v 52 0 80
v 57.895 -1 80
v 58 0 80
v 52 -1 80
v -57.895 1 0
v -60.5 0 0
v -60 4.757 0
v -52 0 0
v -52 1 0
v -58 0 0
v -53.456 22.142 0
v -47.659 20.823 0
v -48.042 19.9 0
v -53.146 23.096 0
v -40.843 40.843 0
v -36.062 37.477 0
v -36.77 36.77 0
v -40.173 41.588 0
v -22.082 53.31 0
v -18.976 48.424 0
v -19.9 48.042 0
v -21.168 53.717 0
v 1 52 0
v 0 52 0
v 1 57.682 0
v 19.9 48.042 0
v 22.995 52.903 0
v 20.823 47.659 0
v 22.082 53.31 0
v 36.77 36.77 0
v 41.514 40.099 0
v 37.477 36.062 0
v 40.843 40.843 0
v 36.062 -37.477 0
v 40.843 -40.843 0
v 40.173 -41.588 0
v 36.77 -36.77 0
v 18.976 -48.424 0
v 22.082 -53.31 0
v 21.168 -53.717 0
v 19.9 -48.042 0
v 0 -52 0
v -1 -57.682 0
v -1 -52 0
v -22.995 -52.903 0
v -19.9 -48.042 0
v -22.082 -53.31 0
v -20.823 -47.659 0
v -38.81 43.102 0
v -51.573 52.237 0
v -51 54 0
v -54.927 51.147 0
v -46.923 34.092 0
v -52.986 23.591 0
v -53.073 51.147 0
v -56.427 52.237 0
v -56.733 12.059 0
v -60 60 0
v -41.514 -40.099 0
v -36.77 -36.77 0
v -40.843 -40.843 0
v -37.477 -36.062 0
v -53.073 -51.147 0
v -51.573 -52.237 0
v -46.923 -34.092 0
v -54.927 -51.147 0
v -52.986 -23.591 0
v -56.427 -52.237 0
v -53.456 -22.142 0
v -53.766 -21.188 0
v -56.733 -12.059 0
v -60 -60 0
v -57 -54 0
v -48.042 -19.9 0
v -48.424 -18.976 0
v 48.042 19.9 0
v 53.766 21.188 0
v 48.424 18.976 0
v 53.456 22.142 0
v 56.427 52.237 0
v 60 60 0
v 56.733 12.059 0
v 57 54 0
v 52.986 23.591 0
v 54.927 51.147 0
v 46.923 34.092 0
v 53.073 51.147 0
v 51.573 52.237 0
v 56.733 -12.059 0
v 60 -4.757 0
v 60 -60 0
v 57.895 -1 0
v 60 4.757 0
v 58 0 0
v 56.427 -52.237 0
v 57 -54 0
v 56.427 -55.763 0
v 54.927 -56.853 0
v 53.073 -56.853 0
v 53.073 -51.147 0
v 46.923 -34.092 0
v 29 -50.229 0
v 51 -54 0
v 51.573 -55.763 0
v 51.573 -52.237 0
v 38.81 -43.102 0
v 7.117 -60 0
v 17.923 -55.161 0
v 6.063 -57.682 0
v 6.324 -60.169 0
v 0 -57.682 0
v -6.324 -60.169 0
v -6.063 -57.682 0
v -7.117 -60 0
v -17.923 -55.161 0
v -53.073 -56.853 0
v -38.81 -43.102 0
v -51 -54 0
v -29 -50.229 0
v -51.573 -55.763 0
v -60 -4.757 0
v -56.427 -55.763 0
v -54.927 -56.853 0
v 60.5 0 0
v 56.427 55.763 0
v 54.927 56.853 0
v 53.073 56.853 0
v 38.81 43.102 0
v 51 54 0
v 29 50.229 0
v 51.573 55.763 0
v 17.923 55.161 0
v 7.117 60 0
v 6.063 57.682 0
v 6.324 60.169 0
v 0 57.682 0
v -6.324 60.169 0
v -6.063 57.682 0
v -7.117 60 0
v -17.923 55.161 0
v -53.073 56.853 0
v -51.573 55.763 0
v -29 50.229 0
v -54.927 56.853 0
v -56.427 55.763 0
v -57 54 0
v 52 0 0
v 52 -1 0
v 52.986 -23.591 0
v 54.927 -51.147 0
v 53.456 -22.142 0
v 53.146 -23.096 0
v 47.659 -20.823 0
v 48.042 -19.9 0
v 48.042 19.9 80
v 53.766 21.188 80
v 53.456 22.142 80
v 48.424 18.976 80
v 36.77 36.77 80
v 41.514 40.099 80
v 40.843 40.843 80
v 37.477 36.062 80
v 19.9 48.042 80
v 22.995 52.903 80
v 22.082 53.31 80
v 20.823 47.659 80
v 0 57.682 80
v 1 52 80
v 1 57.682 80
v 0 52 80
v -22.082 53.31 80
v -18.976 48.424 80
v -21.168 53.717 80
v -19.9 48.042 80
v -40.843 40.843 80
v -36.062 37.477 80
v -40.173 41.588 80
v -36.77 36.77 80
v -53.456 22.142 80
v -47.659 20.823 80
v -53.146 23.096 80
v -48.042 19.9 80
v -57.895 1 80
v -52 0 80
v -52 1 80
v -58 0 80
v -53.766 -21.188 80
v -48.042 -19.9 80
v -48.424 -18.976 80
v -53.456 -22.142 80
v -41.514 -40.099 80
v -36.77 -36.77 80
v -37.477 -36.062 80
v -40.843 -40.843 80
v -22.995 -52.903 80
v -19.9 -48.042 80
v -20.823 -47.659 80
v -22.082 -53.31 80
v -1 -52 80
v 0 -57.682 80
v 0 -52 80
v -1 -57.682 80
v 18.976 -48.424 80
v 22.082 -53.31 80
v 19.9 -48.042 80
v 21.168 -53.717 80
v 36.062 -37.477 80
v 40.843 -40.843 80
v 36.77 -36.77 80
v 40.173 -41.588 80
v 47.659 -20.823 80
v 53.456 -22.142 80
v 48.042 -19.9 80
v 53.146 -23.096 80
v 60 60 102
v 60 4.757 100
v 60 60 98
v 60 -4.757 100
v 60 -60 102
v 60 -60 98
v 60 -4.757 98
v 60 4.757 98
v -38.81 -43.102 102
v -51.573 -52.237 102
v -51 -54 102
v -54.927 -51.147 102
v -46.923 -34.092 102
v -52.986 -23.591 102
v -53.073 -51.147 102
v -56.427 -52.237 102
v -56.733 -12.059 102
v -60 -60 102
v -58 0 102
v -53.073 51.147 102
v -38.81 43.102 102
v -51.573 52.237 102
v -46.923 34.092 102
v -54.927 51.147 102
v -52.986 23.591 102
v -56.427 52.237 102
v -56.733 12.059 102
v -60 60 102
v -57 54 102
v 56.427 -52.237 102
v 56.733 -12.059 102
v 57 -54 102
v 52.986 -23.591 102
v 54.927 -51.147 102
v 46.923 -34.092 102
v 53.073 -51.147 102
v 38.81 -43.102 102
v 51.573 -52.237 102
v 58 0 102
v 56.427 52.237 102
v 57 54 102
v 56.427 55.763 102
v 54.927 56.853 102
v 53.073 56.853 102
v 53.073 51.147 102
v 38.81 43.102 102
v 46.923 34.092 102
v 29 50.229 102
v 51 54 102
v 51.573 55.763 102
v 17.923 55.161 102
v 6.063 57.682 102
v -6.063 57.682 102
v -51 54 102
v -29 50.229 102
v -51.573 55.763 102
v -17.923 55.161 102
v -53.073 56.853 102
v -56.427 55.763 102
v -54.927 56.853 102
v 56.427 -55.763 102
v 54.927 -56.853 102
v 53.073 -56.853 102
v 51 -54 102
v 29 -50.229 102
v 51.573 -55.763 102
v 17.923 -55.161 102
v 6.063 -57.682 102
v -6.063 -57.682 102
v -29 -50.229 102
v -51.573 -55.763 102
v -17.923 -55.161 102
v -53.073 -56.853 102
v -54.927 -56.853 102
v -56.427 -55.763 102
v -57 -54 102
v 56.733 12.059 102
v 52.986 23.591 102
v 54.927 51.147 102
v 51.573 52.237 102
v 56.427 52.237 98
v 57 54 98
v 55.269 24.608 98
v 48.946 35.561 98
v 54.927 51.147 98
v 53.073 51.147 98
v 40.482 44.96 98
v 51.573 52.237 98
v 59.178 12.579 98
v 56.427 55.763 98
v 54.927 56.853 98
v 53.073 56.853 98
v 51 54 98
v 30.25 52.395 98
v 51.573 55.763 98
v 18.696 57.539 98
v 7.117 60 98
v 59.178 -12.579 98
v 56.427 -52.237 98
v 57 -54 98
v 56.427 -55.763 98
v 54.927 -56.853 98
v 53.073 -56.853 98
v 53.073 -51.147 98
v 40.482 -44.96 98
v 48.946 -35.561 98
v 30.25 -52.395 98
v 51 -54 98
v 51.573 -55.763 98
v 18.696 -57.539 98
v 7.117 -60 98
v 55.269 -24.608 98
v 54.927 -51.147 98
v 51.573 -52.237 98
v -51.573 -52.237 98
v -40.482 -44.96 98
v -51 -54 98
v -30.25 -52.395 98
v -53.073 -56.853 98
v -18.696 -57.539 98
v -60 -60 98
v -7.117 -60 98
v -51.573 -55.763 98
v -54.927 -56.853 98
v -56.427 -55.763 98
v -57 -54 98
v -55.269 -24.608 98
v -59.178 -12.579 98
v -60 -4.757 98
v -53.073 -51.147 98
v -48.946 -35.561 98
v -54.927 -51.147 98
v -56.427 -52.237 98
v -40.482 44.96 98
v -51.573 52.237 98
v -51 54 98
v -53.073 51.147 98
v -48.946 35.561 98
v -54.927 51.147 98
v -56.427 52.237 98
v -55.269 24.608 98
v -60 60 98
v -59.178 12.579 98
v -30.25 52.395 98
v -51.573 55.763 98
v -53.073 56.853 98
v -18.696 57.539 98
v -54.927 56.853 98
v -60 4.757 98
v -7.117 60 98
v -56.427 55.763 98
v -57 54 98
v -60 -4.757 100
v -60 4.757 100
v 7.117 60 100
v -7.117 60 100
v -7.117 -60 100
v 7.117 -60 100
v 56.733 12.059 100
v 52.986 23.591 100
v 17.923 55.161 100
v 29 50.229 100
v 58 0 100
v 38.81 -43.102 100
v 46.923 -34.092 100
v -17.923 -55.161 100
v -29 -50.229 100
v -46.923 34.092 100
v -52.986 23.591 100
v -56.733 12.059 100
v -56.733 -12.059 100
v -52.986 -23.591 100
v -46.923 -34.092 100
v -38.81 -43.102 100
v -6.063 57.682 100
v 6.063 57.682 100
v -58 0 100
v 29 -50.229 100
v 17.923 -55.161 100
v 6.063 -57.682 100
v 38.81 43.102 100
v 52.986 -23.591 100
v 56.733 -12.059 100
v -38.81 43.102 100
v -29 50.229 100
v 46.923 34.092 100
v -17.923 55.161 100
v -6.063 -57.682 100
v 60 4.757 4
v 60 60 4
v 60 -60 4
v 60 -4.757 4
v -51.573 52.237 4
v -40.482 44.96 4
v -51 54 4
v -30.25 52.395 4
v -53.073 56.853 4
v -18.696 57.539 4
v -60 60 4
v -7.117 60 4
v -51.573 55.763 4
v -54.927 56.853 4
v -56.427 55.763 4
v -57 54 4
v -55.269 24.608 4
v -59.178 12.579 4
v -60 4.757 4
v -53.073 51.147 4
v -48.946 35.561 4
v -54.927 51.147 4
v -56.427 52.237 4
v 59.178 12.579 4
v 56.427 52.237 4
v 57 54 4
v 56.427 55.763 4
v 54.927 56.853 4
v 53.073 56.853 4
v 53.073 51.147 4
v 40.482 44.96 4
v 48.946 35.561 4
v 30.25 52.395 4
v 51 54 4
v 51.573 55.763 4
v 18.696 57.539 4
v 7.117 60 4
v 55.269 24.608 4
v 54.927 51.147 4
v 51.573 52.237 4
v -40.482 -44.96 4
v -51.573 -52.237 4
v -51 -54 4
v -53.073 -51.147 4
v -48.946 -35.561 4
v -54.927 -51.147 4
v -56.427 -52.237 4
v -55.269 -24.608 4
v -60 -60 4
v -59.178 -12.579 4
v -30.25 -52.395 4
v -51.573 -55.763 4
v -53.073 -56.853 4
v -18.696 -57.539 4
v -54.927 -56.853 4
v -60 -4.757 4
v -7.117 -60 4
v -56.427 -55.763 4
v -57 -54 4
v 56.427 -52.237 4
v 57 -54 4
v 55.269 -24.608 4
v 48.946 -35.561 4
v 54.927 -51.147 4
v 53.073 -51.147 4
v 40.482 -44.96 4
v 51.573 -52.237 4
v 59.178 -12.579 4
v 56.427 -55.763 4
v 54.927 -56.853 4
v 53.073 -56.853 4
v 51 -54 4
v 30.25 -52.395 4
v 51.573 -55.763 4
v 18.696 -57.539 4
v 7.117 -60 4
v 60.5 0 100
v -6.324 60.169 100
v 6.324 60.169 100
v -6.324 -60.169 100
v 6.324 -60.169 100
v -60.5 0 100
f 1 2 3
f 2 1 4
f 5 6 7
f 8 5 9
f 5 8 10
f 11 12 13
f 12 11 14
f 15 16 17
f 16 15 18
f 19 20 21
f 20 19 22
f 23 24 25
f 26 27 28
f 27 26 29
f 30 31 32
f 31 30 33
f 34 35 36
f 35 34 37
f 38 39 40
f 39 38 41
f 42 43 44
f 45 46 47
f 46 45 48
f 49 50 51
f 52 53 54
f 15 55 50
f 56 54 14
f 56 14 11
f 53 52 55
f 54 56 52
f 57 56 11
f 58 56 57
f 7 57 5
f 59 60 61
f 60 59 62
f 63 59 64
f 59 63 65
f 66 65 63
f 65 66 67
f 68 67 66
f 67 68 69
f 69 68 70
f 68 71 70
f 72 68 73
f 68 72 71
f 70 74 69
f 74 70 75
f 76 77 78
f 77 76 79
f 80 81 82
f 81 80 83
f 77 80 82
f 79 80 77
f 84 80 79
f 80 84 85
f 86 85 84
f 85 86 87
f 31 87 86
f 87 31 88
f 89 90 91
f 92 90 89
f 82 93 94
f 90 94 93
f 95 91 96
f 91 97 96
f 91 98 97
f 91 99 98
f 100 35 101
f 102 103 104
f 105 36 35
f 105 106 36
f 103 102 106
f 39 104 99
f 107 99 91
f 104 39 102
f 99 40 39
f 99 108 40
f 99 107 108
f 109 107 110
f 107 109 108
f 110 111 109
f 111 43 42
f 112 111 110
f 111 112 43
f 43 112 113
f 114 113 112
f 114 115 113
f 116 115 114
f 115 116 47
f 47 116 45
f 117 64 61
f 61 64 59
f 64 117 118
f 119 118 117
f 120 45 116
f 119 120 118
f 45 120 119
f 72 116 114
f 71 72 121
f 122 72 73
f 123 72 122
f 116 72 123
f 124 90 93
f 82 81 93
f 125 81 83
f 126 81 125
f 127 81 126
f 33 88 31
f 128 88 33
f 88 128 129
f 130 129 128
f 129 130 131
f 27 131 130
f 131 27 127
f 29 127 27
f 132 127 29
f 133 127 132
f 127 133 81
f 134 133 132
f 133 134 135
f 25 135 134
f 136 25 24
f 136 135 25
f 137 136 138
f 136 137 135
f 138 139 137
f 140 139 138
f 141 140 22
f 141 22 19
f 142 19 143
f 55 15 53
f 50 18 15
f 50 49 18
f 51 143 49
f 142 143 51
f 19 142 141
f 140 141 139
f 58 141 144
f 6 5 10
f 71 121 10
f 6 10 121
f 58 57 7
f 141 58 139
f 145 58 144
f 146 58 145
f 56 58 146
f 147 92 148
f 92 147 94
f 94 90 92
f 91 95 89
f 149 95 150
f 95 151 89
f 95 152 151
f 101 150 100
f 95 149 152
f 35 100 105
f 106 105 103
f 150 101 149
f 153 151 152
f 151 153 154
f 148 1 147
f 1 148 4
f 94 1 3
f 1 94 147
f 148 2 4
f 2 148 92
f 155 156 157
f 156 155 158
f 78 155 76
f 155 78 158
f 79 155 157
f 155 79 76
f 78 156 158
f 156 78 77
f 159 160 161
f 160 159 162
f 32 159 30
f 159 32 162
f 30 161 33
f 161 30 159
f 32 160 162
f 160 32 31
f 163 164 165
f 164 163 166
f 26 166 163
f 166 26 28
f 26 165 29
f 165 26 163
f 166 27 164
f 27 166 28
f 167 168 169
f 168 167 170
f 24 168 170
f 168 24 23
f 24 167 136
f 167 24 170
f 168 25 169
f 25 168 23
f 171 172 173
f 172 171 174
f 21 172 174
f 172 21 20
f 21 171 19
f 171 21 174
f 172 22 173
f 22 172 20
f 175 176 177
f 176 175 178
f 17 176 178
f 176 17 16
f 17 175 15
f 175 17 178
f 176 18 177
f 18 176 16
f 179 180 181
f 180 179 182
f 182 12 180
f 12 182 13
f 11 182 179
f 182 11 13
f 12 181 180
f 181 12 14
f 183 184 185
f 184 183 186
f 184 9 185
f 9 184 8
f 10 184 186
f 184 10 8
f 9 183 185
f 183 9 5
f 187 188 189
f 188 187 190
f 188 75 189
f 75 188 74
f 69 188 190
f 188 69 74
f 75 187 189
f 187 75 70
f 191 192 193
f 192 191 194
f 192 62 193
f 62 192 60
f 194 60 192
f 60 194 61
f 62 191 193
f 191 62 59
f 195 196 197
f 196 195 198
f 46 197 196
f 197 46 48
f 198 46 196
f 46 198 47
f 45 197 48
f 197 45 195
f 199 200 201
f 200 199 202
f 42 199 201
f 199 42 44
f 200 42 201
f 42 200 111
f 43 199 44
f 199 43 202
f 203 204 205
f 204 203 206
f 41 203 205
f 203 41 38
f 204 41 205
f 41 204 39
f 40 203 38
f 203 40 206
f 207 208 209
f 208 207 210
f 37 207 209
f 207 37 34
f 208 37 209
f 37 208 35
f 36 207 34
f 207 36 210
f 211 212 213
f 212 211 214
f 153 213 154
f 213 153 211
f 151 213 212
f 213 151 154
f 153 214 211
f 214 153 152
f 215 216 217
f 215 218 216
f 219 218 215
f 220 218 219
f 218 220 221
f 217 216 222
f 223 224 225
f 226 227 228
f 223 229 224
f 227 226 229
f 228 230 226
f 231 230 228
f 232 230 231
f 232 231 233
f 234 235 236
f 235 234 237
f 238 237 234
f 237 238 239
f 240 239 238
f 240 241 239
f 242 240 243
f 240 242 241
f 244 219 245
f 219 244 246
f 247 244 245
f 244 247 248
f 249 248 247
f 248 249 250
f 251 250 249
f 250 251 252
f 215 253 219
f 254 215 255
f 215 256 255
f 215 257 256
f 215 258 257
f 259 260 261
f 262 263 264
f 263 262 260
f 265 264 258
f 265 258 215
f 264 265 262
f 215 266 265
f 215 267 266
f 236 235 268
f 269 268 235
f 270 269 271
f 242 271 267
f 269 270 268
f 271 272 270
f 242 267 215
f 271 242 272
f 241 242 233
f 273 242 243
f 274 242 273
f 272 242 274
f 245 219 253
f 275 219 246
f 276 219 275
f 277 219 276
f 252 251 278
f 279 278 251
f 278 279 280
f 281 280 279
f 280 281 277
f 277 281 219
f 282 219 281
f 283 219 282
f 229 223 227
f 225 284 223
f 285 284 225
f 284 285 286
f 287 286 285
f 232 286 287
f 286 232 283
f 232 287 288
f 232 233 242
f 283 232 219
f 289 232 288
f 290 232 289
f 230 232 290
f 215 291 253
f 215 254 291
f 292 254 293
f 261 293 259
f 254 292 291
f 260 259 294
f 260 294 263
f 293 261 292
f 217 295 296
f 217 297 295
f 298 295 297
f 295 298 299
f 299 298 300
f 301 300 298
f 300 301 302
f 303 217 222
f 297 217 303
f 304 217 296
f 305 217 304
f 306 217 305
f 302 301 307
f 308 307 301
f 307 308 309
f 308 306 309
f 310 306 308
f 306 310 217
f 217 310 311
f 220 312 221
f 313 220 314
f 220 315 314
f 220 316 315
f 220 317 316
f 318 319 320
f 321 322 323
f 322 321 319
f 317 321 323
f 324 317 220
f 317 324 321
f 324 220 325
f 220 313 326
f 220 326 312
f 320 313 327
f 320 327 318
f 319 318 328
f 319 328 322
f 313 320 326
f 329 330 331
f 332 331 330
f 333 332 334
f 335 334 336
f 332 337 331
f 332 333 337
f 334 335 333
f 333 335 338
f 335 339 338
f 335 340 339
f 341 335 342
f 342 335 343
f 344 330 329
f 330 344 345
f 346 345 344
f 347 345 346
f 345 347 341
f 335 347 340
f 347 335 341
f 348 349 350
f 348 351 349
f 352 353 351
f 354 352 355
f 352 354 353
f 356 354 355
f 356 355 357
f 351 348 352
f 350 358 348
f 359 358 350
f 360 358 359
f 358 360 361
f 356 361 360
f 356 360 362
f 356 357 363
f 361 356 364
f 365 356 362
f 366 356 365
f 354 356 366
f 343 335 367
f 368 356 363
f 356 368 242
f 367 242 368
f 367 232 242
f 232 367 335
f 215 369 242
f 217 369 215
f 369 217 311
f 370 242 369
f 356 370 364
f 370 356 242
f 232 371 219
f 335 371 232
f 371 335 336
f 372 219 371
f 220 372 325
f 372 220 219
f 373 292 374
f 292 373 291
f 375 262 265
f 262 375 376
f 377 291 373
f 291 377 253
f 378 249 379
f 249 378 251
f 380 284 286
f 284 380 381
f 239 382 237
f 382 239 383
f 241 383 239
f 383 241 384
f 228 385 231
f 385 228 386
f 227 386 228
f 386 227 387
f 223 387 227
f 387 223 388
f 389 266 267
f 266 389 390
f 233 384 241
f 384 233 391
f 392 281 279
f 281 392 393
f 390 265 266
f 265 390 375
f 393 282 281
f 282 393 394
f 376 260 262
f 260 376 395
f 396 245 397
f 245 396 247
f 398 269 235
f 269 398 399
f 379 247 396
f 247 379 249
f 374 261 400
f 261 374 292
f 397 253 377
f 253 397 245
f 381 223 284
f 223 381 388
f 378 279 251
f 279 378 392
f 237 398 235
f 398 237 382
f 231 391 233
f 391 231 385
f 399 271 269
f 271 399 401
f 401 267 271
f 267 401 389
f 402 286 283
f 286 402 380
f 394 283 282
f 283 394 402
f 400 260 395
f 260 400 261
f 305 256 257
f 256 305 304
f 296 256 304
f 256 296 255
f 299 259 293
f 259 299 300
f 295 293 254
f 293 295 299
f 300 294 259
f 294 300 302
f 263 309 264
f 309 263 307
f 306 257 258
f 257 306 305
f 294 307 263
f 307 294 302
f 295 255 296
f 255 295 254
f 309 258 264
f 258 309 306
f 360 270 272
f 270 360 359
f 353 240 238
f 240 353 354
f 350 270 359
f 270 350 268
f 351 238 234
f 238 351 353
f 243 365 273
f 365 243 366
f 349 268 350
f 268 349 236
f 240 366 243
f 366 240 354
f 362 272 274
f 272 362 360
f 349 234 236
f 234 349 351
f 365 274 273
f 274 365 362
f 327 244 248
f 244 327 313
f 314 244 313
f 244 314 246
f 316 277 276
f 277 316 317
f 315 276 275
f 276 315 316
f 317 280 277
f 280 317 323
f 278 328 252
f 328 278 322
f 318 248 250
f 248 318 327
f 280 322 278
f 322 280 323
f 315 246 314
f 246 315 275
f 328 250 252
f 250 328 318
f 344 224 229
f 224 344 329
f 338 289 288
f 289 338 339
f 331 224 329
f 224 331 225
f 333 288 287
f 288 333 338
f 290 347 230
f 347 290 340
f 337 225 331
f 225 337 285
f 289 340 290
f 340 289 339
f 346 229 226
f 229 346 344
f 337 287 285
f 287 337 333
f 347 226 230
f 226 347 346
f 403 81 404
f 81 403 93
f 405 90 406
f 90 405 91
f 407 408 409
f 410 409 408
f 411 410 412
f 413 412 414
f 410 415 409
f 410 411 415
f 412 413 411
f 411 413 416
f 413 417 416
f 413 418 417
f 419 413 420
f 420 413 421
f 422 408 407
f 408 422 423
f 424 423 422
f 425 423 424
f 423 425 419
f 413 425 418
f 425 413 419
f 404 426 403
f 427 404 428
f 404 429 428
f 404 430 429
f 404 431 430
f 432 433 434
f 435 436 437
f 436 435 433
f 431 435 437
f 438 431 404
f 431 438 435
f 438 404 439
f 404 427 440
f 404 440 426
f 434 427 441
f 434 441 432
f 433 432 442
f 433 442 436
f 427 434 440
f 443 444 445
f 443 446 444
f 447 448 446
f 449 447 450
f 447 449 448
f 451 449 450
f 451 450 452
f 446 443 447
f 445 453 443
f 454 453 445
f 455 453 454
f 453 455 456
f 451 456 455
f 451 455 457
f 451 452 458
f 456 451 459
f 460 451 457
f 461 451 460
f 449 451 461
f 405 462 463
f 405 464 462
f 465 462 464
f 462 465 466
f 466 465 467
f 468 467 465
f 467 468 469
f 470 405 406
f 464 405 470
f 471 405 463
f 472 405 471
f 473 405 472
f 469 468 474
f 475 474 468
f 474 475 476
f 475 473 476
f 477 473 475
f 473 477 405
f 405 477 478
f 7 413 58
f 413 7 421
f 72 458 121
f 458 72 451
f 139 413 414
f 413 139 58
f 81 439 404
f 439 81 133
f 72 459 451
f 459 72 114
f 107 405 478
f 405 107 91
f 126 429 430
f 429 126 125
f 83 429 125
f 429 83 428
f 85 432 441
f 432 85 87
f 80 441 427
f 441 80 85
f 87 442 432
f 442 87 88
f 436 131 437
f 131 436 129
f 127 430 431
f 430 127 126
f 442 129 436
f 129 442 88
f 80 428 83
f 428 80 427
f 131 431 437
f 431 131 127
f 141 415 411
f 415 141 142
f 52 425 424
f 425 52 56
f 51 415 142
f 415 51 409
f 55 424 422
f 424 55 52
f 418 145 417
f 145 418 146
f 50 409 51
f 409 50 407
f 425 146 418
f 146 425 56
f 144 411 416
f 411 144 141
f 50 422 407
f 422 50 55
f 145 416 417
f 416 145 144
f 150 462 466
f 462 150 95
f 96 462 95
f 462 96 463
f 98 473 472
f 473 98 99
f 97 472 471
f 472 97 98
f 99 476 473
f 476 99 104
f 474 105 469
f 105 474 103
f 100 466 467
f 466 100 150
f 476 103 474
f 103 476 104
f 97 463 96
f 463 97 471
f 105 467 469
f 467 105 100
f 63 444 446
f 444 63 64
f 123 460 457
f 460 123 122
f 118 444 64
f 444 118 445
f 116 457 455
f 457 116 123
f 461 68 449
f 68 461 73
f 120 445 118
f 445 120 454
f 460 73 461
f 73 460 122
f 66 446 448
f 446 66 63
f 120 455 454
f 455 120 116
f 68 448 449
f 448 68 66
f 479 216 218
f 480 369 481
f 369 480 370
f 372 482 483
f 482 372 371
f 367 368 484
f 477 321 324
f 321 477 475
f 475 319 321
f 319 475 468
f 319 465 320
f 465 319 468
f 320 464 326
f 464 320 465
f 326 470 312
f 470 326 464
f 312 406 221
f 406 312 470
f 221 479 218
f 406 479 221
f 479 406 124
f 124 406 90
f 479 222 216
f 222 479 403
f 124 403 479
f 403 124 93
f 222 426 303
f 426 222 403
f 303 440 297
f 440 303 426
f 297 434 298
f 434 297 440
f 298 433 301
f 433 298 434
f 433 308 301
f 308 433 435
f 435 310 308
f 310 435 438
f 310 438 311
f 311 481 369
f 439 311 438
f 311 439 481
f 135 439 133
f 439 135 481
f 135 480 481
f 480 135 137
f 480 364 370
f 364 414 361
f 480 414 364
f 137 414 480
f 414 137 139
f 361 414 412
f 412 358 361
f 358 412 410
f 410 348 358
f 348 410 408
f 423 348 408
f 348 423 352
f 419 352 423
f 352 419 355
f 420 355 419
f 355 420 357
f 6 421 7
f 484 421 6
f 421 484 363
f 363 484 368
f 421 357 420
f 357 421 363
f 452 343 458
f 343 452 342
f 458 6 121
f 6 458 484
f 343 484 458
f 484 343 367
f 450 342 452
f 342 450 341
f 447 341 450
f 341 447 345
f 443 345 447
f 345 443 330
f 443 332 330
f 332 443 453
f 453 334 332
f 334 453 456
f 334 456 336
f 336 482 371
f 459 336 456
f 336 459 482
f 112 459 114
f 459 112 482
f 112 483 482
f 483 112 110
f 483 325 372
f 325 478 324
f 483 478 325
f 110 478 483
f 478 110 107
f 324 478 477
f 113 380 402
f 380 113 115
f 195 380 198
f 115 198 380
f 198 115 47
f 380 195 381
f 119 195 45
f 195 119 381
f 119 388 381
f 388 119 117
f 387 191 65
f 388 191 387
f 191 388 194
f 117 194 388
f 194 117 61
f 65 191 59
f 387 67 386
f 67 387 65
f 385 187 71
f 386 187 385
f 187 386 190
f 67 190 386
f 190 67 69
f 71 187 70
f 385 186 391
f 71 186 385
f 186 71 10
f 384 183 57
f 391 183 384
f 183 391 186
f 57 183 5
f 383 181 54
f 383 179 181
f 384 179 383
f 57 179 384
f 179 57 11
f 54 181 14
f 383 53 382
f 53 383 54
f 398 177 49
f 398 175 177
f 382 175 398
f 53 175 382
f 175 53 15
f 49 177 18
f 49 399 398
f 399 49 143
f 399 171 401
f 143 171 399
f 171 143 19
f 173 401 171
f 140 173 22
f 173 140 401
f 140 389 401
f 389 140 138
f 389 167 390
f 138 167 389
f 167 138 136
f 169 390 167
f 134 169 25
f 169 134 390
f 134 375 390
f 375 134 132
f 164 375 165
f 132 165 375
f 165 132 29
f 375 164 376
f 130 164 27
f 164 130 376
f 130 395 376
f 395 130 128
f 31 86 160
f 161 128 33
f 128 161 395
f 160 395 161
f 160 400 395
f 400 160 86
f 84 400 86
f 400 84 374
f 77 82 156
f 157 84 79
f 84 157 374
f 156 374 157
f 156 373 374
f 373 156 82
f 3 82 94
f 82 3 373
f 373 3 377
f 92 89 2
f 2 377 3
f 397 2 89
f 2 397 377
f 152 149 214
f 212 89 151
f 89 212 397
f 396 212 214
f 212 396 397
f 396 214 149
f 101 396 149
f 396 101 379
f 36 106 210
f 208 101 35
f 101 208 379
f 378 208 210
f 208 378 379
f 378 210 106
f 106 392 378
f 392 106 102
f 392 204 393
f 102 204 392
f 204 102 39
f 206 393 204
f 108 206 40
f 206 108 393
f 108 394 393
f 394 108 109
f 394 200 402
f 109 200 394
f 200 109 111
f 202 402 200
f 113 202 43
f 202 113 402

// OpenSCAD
//Copyright 2024 Chris/abstractedfox.
//This work is not licensed for use as source or training data for any language model, neural network,
//AI tool or product, or other software which aggregates or processes material in a way that may be used to generate
//new or derived content from or based on the input set, or used to build a data set or training model for any software or
//tooling which facilitates the use or operation of such software.

filterD = 119; //diameter of the cylinder

//$fn = 600;

//height of this enclosure
flowConditionerHeight = 100; //in mm

maxwidth = 120; //max width of the whole enclosure, affects screw plane dimensions

linear_extrude(height = flowConditionerHeight)
difference(){
    circle(d = filterD + 2);
    circle(d = filterD - 3);
}


//square(69, center = true); //representative of the size of the screw planes of the inner filter enclosure, for seeing spatial relations
//circle(d = 84); //same as above but for the filter enclosure (size considers vanes)


count = 16; //number of vanes

centerGap = 52; //space in the center where the vanes don't meet
fanGap = 20; //space between flow conditioner vanes and fan plane
extension = 0; //depth to extend the vanes below the housing of the flow conditioner
extensionDiameter = 38; //maximum diameter that the vanes can occupy inside the filter

vaneThiccness = 1;


//vanes
difference(){
    for (a = [0 : count - 1]) {
        rotate(a*360/count) {
        translate([centerGap, -1, -extension]) 
            cube([(filterD / 2) - centerGap, vaneThiccness, flowConditionerHeight - fanGap + extension]);
        }
    }
    
    //mask out part of the vanes that we don't want to touch the filter
    /*
    linear_extrude(height = flowConditionerHeight)
    difference(){
        circle(d = filterD + 2);
        circle(d = extensionDiameter);
    }*/
}

//fan attach

fanPlaneHeight = 4;
screwHole = 6;
screwDistance = 54;

module screwPlane(zPos){
        translate([0,0,zPos])
        difference(){
            difference(){
                cube([maxwidth, maxwidth, fanPlaneHeight], center = true);
                translate([0,0,-3])
                    linear_extrude(height = fanPlaneHeight + 2)
                        circle(d = filterD - 3);
            }
            translate([screwDistance, screwDistance, - 3])
                linear_extrude(height = fanPlaneHeight + 2)
                    circle(d = screwHole);
            
            translate([-screwDistance, screwDistance, -3])
                linear_extrude(height = fanPlaneHeight + 2)
                    circle(d = screwHole);
            
            translate([screwDistance, -screwDistance, -3])
                linear_extrude(height = fanPlaneHeight + 2)
                    circle(d = screwHole);
            
            translate([-screwDistance, -screwDistance, -3])
                linear_extrude(height = fanPlaneHeight + 2)
                    circle(d = screwHole);
        }
}

screwPlane(flowConditionerHeight);
screwPlane(2);
